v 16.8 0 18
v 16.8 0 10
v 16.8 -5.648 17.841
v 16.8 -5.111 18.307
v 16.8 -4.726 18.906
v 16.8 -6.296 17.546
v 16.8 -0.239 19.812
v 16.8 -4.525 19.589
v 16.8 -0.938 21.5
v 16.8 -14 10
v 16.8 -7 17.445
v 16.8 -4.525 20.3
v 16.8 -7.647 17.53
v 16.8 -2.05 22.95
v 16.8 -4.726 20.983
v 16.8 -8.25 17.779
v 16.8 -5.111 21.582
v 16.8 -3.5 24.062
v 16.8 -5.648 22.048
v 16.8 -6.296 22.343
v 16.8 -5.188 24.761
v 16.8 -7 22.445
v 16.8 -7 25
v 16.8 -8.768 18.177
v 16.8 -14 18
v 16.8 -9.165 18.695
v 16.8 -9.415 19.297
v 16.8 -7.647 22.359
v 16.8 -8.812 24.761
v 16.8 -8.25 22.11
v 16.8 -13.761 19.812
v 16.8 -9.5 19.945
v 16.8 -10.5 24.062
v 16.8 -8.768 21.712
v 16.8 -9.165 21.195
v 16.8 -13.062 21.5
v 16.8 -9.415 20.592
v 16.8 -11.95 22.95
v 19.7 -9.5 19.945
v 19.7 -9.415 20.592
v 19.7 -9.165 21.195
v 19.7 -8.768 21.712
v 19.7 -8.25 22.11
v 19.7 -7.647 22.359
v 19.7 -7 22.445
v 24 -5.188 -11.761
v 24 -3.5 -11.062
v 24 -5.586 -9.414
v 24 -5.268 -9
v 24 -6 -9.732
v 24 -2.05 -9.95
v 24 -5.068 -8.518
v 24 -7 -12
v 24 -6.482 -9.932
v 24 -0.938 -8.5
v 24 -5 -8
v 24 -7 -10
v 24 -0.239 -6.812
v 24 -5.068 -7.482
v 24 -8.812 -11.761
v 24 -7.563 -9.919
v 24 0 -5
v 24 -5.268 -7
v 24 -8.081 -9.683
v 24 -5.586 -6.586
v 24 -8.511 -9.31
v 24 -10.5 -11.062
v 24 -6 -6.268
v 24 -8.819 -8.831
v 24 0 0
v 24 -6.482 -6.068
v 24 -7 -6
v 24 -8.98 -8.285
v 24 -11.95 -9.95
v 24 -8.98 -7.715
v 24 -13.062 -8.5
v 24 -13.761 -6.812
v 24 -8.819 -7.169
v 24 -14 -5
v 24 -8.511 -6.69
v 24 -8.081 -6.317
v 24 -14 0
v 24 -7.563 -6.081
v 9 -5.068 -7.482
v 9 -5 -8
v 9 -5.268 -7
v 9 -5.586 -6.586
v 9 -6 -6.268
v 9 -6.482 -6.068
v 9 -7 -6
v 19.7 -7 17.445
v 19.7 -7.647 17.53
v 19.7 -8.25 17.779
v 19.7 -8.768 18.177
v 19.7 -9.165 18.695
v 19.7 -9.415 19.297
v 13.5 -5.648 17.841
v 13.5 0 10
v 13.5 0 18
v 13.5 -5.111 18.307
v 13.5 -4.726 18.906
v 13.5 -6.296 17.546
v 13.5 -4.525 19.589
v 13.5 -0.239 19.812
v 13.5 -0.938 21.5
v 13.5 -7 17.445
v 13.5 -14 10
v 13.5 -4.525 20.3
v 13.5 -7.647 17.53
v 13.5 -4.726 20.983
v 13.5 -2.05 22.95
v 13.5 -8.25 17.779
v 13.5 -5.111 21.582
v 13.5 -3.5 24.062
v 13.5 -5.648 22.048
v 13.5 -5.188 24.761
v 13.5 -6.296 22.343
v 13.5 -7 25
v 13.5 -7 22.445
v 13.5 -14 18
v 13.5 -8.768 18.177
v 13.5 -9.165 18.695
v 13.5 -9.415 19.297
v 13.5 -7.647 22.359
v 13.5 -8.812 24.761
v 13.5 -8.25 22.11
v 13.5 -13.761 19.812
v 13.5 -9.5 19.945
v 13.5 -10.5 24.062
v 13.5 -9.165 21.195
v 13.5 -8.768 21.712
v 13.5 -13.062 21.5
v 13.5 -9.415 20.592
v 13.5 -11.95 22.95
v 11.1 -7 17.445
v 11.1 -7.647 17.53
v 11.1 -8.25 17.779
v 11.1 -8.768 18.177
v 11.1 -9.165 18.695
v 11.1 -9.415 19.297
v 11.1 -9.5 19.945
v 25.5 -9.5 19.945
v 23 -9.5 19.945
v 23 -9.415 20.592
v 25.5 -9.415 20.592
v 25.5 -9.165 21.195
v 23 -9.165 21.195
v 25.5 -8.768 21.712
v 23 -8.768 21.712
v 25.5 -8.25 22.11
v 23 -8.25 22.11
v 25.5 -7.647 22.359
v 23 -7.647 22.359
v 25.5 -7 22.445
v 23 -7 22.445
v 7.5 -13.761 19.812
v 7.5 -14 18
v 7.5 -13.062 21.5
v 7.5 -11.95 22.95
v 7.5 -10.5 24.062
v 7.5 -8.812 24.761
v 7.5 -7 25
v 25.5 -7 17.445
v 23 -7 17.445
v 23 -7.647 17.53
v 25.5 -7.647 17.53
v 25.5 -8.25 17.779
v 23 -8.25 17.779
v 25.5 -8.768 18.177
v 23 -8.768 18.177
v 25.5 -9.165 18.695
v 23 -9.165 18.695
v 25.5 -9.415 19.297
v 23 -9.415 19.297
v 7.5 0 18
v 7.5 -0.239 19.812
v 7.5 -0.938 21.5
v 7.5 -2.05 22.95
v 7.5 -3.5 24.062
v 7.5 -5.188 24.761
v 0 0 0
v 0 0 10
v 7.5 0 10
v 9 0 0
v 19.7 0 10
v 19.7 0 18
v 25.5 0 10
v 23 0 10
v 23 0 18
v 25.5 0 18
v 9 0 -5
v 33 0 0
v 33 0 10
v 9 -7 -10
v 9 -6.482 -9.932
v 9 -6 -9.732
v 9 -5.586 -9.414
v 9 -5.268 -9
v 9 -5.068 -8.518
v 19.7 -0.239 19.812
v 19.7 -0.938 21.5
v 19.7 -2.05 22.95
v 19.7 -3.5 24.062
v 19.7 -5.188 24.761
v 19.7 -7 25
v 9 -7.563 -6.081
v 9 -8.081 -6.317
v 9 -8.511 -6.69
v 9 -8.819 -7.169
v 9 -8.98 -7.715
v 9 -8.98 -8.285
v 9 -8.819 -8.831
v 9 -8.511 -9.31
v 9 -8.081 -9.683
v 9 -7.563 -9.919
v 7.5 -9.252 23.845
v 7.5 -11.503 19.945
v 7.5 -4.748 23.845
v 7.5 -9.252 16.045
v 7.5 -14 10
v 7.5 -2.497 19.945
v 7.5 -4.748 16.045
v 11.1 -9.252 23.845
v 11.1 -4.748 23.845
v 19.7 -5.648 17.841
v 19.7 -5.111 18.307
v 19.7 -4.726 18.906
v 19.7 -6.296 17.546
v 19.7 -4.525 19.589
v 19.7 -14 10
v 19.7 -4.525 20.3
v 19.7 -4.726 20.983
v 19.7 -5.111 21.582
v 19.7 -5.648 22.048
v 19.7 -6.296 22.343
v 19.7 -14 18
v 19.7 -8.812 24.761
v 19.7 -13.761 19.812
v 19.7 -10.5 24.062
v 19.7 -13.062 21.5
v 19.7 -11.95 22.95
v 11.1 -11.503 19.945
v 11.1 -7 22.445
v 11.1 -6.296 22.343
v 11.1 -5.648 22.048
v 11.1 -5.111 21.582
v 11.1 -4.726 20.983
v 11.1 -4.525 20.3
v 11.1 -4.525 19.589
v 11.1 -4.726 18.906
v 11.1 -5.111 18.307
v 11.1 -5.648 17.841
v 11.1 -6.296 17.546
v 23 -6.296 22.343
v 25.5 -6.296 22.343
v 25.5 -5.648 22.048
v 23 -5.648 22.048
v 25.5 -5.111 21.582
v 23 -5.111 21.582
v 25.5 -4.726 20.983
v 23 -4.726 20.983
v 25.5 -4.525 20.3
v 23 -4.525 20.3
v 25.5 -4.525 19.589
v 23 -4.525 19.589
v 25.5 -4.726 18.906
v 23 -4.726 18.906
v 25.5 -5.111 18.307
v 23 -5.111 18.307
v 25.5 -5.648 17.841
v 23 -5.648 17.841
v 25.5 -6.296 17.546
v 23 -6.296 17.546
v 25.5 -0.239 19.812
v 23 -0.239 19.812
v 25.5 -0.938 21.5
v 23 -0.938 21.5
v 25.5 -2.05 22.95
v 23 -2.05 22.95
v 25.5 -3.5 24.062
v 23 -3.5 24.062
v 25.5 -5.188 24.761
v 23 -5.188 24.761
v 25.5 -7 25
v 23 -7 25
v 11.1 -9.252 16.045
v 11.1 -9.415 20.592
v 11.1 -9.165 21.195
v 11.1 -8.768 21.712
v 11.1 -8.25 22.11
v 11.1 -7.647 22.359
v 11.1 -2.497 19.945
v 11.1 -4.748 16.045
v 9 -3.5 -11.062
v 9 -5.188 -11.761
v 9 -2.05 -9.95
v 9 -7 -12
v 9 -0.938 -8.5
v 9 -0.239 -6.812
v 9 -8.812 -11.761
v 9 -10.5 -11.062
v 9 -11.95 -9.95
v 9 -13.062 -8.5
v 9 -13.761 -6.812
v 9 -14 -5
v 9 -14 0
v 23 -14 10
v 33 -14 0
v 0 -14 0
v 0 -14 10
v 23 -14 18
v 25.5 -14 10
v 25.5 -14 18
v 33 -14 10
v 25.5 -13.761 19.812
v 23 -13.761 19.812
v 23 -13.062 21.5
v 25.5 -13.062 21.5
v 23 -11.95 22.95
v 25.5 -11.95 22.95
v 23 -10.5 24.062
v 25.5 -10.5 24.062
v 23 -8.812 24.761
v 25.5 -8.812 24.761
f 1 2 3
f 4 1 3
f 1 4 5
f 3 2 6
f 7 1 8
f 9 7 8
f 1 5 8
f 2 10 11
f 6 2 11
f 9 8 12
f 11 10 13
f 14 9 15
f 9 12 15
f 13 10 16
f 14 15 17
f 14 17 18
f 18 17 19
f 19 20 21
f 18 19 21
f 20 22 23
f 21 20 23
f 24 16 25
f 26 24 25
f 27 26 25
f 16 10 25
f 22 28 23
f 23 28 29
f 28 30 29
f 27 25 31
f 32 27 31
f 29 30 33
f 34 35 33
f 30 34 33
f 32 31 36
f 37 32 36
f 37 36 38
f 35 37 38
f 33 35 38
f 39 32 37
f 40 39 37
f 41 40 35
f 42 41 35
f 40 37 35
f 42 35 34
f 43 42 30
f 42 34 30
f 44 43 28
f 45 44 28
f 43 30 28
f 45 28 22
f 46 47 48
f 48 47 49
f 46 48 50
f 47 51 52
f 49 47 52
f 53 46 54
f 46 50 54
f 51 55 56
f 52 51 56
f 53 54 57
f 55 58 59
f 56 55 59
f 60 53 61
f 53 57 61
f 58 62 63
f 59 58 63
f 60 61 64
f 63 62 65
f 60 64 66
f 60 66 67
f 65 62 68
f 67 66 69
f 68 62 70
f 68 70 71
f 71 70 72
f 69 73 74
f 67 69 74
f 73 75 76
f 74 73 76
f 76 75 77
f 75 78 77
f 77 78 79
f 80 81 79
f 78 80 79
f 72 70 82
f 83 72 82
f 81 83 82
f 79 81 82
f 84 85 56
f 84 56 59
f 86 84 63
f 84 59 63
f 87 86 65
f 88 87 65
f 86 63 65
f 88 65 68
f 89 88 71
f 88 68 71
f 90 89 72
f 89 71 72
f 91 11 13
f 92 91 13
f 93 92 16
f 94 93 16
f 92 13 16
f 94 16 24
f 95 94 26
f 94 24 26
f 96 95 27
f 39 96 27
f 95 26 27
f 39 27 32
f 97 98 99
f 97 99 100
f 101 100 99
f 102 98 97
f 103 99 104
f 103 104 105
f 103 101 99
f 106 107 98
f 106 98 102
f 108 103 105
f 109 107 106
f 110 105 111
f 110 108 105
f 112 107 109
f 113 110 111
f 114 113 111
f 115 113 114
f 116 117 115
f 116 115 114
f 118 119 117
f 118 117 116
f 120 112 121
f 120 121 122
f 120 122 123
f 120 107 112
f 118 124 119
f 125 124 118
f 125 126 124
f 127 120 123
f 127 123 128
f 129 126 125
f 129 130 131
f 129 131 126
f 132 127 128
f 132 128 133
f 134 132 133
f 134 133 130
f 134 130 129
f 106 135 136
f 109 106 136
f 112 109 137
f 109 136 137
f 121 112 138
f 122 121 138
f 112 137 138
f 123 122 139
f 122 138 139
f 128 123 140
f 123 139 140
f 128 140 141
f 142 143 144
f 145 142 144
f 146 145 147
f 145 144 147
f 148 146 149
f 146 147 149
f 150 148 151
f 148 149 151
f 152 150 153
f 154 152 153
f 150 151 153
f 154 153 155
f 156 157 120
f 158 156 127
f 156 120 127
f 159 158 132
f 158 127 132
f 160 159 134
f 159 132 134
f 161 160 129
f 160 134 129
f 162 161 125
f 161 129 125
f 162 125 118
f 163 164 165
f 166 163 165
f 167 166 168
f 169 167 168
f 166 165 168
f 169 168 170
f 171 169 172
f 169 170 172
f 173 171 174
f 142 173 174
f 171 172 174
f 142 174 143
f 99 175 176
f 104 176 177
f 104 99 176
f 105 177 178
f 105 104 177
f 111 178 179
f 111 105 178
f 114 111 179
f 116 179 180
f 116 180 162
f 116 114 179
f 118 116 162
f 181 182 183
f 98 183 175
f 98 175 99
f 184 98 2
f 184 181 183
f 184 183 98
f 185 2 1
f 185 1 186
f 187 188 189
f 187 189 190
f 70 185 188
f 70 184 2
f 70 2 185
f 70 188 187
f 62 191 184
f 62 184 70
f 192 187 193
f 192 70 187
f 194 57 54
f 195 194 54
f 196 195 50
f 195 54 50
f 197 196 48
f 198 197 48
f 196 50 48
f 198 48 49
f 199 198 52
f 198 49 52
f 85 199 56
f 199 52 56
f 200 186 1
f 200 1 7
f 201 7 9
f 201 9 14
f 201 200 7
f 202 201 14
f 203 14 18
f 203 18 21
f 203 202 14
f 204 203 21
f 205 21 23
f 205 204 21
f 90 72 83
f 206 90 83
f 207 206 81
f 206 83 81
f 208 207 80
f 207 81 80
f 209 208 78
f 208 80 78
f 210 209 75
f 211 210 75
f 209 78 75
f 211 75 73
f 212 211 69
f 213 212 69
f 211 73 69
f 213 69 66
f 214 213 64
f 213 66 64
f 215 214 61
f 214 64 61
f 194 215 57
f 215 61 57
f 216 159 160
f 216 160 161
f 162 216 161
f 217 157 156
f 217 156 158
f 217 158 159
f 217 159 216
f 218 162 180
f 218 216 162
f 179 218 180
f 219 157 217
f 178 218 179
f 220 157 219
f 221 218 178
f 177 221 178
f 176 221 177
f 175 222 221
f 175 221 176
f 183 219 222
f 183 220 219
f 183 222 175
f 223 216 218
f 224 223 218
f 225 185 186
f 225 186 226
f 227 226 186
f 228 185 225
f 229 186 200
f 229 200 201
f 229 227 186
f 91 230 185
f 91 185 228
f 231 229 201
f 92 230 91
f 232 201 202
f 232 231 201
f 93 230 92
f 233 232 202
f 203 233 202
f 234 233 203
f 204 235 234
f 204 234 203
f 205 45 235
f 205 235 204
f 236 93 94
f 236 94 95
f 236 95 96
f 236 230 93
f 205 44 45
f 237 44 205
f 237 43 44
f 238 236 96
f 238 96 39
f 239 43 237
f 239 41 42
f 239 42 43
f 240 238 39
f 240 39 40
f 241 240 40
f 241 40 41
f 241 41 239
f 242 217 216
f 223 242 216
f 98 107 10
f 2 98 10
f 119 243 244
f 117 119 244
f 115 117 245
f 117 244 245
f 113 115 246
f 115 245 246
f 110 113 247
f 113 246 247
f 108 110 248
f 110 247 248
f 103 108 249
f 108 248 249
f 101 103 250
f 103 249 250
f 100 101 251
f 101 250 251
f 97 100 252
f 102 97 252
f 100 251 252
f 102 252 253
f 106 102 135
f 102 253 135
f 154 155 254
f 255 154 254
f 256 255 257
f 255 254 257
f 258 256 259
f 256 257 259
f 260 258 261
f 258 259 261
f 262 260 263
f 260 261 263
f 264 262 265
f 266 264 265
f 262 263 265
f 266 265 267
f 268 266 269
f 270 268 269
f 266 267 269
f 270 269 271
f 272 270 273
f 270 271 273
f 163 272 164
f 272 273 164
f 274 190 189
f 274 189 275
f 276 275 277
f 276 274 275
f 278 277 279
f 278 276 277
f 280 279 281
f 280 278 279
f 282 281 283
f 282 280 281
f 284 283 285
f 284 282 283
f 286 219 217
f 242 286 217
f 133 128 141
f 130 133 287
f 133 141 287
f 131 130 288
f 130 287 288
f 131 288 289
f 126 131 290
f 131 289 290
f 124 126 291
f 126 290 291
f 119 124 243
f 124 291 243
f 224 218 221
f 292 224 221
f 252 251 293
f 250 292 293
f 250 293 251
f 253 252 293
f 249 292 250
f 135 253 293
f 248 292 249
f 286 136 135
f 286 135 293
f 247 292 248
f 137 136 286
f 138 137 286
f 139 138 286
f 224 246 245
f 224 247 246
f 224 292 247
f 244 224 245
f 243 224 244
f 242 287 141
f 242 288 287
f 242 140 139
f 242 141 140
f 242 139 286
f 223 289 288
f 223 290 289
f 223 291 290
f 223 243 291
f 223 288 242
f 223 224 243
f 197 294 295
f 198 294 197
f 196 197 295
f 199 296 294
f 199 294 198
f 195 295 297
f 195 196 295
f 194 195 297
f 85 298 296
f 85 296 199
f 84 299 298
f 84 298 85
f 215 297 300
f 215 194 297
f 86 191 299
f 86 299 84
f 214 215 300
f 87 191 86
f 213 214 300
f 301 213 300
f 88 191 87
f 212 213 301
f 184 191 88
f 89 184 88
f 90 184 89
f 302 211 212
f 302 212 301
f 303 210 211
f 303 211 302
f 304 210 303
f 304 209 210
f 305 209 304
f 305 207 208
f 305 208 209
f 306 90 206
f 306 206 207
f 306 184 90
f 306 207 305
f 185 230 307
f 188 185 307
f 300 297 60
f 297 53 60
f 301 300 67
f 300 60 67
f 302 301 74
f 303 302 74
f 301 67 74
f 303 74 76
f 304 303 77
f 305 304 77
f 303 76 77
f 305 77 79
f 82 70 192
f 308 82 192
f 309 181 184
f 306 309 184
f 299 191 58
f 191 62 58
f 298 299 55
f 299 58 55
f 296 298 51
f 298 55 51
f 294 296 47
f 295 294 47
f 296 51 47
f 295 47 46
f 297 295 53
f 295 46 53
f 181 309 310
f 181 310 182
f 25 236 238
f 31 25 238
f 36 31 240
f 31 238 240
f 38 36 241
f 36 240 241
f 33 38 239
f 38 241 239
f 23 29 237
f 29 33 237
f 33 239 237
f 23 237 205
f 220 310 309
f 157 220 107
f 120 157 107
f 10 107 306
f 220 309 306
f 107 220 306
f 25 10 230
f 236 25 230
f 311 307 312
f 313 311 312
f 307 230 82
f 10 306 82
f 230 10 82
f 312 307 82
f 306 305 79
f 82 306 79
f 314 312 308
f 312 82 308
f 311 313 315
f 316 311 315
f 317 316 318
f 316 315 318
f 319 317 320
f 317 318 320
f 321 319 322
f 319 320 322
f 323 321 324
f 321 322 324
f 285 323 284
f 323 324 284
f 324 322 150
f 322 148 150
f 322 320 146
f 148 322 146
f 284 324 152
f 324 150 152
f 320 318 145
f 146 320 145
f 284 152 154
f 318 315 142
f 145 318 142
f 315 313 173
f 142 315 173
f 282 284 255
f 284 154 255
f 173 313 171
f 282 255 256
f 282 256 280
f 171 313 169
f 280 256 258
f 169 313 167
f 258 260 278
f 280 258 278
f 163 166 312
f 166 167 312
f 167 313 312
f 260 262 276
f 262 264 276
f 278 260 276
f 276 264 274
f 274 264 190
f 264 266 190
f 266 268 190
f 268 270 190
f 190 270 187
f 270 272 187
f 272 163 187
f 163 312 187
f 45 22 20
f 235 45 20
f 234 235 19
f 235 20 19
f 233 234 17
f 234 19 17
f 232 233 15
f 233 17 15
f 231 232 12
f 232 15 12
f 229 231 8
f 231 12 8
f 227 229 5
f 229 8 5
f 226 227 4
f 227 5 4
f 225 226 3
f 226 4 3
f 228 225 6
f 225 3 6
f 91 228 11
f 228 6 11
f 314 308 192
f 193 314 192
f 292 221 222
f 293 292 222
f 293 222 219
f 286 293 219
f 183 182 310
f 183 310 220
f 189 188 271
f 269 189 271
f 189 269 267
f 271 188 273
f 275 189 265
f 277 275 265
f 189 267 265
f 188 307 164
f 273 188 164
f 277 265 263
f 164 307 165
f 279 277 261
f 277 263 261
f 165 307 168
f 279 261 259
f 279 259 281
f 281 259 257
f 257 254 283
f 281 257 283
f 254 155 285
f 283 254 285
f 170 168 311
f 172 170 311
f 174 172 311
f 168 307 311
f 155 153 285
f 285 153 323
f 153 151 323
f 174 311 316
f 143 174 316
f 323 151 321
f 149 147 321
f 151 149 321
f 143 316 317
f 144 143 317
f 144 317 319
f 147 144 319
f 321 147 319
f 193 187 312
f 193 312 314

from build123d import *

# Parameters (mm, degrees)
F0_W      = 33
F0_H      = 14
F1_DEPTH  = 10
F2_W      = 15
F2_H      = 14
F3_DEPTH  = 12
F4_R      = 7
F5_R      = 6.99999
F7_DEPTH  = 24.001
F8_W      = 18
F8_H      = 14
F9_DEPTH  = 15
F11_DEPTH = 25
F13_R     = 6.99999
F12_W     = 3.3
F12_H     = 15
F14_DEPTH = 25
F15_R     = 2.5
F16_DEPTH = 3.6


# Not quite as in the source:
# - a fillet or chamfer is up to 0.001 mm smaller than in the source, because OpenCascade refuses the exact size


with BuildPart() as f1:
    # F0 (on Top) → F1 (new body)
    with BuildSketch(Plane.XY):
        with Locations((16.5, -7)):
            Rectangle(F0_W, F0_H)
    extrude(amount=F1_DEPTH)

    # F2 (on face) → F3 (join)
    with BuildSketch(Plane(origin=(0, 0, 0), x_dir=(1, 0, 0), z_dir=(0, 0, -1))):
        with Locations((16.5, 7)):
            Rectangle(F2_W, F2_H)
    extrude(amount=F3_DEPTH)

    # F4
    f4_edges = [f1.edges().sort_by_distance(p)[0] for p in [
        (16.5, 0, -12),
    ]]
    fillet(f4_edges, radius=F4_R)

    # F5 (radius 7 in the source; OpenCascade refuses exactly that, so slightly less here)
    f5_edges = [f1.edges().sort_by_distance(p)[0] for p in [
        (16.5, -14, -12),
    ]]
    fillet(f5_edges, radius=F5_R)

    # F6 (on face) → F7 (cut, through all)
    with BuildSketch(Plane.YZ.offset(24)):
        with BuildLine():
            Line((-7, -10), (-7, -6))
            ThreePointArc((-7, -6), (-9, -8), (-7, -10))
        make_face()
        with BuildLine():
            ThreePointArc((-7, -10), (-5.5857864376, -9.4142135624), (-5, -8))
            ThreePointArc((-5, -8), (-5.5857864376, -6.5857864376), (-7, -6))
            Line((-7, -6), (-7, -10))
        make_face()
    extrude(amount=-F7_DEPTH, mode=Mode.SUBTRACT)

    # F8 (on face) → F9 (join)
    with BuildSketch(Plane.XY.offset(10)):
        with Locations((16.5, -7)):
            Rectangle(F8_W, F8_H)
    extrude(amount=F9_DEPTH)

    # F10 (on face) → F11 (cut)
    with BuildSketch(Plane(origin=(7.5, 0, 0), x_dir=(0, -1, 0), z_dir=(-1, 0, 0))):
        with BuildLine():
            Line((7, 22.4445006251), (7, 17.4445006251))
            ThreePointArc((7, 17.4445006251), (8.767766953, 18.1767336722), (9.5, 19.9445006251))
            ThreePointArc((9.5, 19.9445006251), (8.767766953, 21.7122675781), (7, 22.4445006251))
        make_face()
        with BuildLine():
            ThreePointArc((7, 22.4445006251), (4.5, 19.9445006251), (7, 17.4445006251))
            Line((7, 17.4445006251), (7, 22.4445006251))
        make_face()
    extrude(amount=-F11_DEPTH, mode=Mode.SUBTRACT)

    # F13 (radius 7 in the source; OpenCascade refuses exactly that, so slightly less here)
    f13_edges = [f1.edges().sort_by_distance(p)[0] for p in [
        (16.5, -14, 25),
        (16.5, 0, 25),
    ]]
    fillet(f13_edges, radius=F13_R)

    # F12 (on face) → F14 (cut)
    with BuildSketch(Plane.XZ.offset(14)):
        with Locations((21.35, 17.5)):
            Rectangle(F12_W, F12_H)
        with Locations((15.15, 17.5)):
            Rectangle(F12_W, F12_H)
    extrude(amount=-F14_DEPTH, mode=Mode.SUBTRACT)

    # F15 (on face) → F16 (cut)
    with BuildSketch(Plane(origin=(7.5, 0, 0), x_dir=(0, -1, 0), z_dir=(-1, 0, 0))):
        Polygon((4.7483339502, 16.0445006251), (9.2516660498, 16.0445006251), (11.5033320997, 19.9445006251), (9.2516660498, 23.8445006251), (4.7483339502, 23.8445006251), (2.4966679003, 19.9445006251), align=None)
        with Locations((7, 19.9445006251)):
            Circle(F15_R, mode=Mode.SUBTRACT)
    extrude(amount=-F16_DEPTH, mode=Mode.SUBTRACT)


solid = f1.part
